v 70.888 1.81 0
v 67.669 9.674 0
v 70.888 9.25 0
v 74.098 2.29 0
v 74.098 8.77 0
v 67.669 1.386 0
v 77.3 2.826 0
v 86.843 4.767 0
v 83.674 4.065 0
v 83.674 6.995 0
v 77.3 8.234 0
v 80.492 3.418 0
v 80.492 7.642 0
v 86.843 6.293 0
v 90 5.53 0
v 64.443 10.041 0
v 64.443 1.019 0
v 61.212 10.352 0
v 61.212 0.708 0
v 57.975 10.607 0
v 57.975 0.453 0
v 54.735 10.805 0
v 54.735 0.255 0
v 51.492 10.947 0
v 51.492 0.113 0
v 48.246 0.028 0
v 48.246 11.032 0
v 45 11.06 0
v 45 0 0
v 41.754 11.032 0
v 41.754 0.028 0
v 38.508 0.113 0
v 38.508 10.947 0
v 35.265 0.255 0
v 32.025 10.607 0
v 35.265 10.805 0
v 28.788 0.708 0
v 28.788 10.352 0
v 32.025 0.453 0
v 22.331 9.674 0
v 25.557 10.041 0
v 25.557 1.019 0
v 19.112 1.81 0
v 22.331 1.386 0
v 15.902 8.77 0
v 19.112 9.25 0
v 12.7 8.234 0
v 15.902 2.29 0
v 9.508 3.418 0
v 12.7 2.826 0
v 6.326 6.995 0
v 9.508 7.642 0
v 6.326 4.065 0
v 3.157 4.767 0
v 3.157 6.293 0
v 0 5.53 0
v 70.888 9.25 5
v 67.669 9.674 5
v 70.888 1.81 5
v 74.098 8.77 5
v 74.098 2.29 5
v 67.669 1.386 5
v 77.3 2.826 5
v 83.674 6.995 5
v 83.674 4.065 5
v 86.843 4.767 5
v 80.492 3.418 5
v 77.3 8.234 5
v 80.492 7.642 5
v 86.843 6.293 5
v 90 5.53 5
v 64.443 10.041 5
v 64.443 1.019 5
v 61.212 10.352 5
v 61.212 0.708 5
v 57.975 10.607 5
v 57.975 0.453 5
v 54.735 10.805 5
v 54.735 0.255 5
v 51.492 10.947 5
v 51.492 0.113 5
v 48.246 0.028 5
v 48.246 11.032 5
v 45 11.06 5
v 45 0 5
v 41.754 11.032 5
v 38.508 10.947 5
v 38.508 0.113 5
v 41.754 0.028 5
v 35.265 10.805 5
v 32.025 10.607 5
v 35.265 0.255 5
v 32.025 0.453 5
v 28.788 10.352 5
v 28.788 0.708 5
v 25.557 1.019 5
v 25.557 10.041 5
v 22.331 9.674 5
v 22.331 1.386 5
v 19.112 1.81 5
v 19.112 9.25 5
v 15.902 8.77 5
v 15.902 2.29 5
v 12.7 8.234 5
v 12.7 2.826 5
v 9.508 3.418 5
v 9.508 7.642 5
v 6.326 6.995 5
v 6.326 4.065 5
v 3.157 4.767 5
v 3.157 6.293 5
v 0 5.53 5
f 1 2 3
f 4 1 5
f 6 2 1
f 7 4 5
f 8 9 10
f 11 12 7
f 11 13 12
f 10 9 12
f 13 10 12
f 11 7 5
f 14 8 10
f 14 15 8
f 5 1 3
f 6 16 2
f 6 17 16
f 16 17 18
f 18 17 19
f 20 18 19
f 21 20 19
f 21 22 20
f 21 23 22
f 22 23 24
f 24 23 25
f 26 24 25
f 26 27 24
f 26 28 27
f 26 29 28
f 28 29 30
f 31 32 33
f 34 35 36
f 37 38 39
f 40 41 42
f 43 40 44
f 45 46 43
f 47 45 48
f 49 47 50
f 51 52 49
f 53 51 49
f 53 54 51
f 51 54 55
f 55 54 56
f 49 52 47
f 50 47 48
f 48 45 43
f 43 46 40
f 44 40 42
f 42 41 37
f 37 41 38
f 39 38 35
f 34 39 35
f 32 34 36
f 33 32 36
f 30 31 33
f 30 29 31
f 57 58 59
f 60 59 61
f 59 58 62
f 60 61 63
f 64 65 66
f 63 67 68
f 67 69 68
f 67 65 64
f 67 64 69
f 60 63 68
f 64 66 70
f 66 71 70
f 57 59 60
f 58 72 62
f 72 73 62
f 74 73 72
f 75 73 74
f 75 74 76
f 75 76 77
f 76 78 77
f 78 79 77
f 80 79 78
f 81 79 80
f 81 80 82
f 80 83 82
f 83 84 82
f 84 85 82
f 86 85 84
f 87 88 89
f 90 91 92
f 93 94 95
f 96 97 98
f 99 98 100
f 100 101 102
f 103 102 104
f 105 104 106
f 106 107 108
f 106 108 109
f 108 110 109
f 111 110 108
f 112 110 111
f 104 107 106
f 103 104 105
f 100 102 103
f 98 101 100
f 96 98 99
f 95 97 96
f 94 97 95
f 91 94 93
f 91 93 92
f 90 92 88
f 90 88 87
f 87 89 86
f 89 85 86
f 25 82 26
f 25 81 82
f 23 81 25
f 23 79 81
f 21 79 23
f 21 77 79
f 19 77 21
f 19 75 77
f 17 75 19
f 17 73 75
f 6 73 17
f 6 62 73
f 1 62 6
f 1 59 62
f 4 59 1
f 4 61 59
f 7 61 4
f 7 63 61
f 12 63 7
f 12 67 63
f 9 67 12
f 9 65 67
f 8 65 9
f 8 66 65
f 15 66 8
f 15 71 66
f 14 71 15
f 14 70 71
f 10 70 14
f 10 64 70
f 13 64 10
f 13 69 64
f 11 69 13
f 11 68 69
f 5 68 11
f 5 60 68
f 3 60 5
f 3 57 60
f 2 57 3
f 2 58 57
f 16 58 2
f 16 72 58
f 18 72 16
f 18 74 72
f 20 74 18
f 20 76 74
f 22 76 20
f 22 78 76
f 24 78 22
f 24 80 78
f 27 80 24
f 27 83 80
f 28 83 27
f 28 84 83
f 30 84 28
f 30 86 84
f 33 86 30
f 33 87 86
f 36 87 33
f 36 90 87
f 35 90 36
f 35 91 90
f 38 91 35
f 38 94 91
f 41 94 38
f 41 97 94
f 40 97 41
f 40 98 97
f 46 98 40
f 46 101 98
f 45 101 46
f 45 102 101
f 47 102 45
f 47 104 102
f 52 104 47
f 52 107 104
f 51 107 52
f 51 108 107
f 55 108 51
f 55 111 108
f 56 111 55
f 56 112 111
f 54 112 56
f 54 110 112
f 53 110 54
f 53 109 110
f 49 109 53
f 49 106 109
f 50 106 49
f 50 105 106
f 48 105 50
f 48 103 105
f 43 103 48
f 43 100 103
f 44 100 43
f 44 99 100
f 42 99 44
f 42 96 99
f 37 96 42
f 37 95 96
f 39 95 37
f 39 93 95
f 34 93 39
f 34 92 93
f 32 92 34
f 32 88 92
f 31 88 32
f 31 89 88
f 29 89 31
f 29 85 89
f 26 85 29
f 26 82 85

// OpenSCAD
$fn = 32;

// ----------------------------------------------------------------------
// Arc profile plate: lens, 56 points
// ----------------------------------------------------------------------

// --- parameters (mm) ---
lens_chord = 90;          // chord length of the lens, X
arc_r = 186.01;           // radius of both arcs
arc_angle = 28;           // angle of each arc, degrees
sagitta = 5.53;           // bulge of each arc (half the lens height)
arc_step = 1;             // sampling step of the arcs, degrees
plate_t = 5;              // plate thickness, Z

bbox_y = 2 * sagitta;  // full lens height

profile = [[90, 5.53], [86.843, 6.293], [83.674, 6.995], [80.492, 7.642], [77.3, 8.234], [74.098, 8.77], [70.888, 9.25], [67.669, 9.674], [64.443, 10.041], [61.212, 10.352], [57.975, 10.607], [54.735, 10.805], [51.492, 10.947], [48.246, 11.032], [45, 11.06], [41.754, 11.032], [38.508, 10.947], [35.265, 10.805], [32.025, 10.607], [28.788, 10.352], [25.557, 10.041], [22.331, 9.674], [19.112, 9.25], [15.902, 8.77], [12.7, 8.234], [9.508, 7.642], [6.326, 6.995], [3.157, 6.293], [0, 5.53], [3.157, 4.767], [6.326, 4.065], [9.508, 3.418], [12.7, 2.826], [15.902, 2.29], [19.112, 1.81], [22.331, 1.386], [25.557, 1.019], [28.788, 0.708], [32.025, 0.453], [35.265, 0.255], [38.508, 0.113], [41.754, 0.028], [45, 0], [48.246, 0.028], [51.492, 0.113], [54.735, 0.255], [57.975, 0.453], [61.212, 0.708], [64.443, 1.019], [67.669, 1.386], [70.888, 1.81], [74.098, 2.29], [77.3, 2.826], [80.492, 3.418], [83.674, 4.065], [86.843, 4.767]];  // primary outline, 56 points, counter clockwise

// --- the one profile operation ---
linear_extrude(height = plate_t) polygon(points = profile);
